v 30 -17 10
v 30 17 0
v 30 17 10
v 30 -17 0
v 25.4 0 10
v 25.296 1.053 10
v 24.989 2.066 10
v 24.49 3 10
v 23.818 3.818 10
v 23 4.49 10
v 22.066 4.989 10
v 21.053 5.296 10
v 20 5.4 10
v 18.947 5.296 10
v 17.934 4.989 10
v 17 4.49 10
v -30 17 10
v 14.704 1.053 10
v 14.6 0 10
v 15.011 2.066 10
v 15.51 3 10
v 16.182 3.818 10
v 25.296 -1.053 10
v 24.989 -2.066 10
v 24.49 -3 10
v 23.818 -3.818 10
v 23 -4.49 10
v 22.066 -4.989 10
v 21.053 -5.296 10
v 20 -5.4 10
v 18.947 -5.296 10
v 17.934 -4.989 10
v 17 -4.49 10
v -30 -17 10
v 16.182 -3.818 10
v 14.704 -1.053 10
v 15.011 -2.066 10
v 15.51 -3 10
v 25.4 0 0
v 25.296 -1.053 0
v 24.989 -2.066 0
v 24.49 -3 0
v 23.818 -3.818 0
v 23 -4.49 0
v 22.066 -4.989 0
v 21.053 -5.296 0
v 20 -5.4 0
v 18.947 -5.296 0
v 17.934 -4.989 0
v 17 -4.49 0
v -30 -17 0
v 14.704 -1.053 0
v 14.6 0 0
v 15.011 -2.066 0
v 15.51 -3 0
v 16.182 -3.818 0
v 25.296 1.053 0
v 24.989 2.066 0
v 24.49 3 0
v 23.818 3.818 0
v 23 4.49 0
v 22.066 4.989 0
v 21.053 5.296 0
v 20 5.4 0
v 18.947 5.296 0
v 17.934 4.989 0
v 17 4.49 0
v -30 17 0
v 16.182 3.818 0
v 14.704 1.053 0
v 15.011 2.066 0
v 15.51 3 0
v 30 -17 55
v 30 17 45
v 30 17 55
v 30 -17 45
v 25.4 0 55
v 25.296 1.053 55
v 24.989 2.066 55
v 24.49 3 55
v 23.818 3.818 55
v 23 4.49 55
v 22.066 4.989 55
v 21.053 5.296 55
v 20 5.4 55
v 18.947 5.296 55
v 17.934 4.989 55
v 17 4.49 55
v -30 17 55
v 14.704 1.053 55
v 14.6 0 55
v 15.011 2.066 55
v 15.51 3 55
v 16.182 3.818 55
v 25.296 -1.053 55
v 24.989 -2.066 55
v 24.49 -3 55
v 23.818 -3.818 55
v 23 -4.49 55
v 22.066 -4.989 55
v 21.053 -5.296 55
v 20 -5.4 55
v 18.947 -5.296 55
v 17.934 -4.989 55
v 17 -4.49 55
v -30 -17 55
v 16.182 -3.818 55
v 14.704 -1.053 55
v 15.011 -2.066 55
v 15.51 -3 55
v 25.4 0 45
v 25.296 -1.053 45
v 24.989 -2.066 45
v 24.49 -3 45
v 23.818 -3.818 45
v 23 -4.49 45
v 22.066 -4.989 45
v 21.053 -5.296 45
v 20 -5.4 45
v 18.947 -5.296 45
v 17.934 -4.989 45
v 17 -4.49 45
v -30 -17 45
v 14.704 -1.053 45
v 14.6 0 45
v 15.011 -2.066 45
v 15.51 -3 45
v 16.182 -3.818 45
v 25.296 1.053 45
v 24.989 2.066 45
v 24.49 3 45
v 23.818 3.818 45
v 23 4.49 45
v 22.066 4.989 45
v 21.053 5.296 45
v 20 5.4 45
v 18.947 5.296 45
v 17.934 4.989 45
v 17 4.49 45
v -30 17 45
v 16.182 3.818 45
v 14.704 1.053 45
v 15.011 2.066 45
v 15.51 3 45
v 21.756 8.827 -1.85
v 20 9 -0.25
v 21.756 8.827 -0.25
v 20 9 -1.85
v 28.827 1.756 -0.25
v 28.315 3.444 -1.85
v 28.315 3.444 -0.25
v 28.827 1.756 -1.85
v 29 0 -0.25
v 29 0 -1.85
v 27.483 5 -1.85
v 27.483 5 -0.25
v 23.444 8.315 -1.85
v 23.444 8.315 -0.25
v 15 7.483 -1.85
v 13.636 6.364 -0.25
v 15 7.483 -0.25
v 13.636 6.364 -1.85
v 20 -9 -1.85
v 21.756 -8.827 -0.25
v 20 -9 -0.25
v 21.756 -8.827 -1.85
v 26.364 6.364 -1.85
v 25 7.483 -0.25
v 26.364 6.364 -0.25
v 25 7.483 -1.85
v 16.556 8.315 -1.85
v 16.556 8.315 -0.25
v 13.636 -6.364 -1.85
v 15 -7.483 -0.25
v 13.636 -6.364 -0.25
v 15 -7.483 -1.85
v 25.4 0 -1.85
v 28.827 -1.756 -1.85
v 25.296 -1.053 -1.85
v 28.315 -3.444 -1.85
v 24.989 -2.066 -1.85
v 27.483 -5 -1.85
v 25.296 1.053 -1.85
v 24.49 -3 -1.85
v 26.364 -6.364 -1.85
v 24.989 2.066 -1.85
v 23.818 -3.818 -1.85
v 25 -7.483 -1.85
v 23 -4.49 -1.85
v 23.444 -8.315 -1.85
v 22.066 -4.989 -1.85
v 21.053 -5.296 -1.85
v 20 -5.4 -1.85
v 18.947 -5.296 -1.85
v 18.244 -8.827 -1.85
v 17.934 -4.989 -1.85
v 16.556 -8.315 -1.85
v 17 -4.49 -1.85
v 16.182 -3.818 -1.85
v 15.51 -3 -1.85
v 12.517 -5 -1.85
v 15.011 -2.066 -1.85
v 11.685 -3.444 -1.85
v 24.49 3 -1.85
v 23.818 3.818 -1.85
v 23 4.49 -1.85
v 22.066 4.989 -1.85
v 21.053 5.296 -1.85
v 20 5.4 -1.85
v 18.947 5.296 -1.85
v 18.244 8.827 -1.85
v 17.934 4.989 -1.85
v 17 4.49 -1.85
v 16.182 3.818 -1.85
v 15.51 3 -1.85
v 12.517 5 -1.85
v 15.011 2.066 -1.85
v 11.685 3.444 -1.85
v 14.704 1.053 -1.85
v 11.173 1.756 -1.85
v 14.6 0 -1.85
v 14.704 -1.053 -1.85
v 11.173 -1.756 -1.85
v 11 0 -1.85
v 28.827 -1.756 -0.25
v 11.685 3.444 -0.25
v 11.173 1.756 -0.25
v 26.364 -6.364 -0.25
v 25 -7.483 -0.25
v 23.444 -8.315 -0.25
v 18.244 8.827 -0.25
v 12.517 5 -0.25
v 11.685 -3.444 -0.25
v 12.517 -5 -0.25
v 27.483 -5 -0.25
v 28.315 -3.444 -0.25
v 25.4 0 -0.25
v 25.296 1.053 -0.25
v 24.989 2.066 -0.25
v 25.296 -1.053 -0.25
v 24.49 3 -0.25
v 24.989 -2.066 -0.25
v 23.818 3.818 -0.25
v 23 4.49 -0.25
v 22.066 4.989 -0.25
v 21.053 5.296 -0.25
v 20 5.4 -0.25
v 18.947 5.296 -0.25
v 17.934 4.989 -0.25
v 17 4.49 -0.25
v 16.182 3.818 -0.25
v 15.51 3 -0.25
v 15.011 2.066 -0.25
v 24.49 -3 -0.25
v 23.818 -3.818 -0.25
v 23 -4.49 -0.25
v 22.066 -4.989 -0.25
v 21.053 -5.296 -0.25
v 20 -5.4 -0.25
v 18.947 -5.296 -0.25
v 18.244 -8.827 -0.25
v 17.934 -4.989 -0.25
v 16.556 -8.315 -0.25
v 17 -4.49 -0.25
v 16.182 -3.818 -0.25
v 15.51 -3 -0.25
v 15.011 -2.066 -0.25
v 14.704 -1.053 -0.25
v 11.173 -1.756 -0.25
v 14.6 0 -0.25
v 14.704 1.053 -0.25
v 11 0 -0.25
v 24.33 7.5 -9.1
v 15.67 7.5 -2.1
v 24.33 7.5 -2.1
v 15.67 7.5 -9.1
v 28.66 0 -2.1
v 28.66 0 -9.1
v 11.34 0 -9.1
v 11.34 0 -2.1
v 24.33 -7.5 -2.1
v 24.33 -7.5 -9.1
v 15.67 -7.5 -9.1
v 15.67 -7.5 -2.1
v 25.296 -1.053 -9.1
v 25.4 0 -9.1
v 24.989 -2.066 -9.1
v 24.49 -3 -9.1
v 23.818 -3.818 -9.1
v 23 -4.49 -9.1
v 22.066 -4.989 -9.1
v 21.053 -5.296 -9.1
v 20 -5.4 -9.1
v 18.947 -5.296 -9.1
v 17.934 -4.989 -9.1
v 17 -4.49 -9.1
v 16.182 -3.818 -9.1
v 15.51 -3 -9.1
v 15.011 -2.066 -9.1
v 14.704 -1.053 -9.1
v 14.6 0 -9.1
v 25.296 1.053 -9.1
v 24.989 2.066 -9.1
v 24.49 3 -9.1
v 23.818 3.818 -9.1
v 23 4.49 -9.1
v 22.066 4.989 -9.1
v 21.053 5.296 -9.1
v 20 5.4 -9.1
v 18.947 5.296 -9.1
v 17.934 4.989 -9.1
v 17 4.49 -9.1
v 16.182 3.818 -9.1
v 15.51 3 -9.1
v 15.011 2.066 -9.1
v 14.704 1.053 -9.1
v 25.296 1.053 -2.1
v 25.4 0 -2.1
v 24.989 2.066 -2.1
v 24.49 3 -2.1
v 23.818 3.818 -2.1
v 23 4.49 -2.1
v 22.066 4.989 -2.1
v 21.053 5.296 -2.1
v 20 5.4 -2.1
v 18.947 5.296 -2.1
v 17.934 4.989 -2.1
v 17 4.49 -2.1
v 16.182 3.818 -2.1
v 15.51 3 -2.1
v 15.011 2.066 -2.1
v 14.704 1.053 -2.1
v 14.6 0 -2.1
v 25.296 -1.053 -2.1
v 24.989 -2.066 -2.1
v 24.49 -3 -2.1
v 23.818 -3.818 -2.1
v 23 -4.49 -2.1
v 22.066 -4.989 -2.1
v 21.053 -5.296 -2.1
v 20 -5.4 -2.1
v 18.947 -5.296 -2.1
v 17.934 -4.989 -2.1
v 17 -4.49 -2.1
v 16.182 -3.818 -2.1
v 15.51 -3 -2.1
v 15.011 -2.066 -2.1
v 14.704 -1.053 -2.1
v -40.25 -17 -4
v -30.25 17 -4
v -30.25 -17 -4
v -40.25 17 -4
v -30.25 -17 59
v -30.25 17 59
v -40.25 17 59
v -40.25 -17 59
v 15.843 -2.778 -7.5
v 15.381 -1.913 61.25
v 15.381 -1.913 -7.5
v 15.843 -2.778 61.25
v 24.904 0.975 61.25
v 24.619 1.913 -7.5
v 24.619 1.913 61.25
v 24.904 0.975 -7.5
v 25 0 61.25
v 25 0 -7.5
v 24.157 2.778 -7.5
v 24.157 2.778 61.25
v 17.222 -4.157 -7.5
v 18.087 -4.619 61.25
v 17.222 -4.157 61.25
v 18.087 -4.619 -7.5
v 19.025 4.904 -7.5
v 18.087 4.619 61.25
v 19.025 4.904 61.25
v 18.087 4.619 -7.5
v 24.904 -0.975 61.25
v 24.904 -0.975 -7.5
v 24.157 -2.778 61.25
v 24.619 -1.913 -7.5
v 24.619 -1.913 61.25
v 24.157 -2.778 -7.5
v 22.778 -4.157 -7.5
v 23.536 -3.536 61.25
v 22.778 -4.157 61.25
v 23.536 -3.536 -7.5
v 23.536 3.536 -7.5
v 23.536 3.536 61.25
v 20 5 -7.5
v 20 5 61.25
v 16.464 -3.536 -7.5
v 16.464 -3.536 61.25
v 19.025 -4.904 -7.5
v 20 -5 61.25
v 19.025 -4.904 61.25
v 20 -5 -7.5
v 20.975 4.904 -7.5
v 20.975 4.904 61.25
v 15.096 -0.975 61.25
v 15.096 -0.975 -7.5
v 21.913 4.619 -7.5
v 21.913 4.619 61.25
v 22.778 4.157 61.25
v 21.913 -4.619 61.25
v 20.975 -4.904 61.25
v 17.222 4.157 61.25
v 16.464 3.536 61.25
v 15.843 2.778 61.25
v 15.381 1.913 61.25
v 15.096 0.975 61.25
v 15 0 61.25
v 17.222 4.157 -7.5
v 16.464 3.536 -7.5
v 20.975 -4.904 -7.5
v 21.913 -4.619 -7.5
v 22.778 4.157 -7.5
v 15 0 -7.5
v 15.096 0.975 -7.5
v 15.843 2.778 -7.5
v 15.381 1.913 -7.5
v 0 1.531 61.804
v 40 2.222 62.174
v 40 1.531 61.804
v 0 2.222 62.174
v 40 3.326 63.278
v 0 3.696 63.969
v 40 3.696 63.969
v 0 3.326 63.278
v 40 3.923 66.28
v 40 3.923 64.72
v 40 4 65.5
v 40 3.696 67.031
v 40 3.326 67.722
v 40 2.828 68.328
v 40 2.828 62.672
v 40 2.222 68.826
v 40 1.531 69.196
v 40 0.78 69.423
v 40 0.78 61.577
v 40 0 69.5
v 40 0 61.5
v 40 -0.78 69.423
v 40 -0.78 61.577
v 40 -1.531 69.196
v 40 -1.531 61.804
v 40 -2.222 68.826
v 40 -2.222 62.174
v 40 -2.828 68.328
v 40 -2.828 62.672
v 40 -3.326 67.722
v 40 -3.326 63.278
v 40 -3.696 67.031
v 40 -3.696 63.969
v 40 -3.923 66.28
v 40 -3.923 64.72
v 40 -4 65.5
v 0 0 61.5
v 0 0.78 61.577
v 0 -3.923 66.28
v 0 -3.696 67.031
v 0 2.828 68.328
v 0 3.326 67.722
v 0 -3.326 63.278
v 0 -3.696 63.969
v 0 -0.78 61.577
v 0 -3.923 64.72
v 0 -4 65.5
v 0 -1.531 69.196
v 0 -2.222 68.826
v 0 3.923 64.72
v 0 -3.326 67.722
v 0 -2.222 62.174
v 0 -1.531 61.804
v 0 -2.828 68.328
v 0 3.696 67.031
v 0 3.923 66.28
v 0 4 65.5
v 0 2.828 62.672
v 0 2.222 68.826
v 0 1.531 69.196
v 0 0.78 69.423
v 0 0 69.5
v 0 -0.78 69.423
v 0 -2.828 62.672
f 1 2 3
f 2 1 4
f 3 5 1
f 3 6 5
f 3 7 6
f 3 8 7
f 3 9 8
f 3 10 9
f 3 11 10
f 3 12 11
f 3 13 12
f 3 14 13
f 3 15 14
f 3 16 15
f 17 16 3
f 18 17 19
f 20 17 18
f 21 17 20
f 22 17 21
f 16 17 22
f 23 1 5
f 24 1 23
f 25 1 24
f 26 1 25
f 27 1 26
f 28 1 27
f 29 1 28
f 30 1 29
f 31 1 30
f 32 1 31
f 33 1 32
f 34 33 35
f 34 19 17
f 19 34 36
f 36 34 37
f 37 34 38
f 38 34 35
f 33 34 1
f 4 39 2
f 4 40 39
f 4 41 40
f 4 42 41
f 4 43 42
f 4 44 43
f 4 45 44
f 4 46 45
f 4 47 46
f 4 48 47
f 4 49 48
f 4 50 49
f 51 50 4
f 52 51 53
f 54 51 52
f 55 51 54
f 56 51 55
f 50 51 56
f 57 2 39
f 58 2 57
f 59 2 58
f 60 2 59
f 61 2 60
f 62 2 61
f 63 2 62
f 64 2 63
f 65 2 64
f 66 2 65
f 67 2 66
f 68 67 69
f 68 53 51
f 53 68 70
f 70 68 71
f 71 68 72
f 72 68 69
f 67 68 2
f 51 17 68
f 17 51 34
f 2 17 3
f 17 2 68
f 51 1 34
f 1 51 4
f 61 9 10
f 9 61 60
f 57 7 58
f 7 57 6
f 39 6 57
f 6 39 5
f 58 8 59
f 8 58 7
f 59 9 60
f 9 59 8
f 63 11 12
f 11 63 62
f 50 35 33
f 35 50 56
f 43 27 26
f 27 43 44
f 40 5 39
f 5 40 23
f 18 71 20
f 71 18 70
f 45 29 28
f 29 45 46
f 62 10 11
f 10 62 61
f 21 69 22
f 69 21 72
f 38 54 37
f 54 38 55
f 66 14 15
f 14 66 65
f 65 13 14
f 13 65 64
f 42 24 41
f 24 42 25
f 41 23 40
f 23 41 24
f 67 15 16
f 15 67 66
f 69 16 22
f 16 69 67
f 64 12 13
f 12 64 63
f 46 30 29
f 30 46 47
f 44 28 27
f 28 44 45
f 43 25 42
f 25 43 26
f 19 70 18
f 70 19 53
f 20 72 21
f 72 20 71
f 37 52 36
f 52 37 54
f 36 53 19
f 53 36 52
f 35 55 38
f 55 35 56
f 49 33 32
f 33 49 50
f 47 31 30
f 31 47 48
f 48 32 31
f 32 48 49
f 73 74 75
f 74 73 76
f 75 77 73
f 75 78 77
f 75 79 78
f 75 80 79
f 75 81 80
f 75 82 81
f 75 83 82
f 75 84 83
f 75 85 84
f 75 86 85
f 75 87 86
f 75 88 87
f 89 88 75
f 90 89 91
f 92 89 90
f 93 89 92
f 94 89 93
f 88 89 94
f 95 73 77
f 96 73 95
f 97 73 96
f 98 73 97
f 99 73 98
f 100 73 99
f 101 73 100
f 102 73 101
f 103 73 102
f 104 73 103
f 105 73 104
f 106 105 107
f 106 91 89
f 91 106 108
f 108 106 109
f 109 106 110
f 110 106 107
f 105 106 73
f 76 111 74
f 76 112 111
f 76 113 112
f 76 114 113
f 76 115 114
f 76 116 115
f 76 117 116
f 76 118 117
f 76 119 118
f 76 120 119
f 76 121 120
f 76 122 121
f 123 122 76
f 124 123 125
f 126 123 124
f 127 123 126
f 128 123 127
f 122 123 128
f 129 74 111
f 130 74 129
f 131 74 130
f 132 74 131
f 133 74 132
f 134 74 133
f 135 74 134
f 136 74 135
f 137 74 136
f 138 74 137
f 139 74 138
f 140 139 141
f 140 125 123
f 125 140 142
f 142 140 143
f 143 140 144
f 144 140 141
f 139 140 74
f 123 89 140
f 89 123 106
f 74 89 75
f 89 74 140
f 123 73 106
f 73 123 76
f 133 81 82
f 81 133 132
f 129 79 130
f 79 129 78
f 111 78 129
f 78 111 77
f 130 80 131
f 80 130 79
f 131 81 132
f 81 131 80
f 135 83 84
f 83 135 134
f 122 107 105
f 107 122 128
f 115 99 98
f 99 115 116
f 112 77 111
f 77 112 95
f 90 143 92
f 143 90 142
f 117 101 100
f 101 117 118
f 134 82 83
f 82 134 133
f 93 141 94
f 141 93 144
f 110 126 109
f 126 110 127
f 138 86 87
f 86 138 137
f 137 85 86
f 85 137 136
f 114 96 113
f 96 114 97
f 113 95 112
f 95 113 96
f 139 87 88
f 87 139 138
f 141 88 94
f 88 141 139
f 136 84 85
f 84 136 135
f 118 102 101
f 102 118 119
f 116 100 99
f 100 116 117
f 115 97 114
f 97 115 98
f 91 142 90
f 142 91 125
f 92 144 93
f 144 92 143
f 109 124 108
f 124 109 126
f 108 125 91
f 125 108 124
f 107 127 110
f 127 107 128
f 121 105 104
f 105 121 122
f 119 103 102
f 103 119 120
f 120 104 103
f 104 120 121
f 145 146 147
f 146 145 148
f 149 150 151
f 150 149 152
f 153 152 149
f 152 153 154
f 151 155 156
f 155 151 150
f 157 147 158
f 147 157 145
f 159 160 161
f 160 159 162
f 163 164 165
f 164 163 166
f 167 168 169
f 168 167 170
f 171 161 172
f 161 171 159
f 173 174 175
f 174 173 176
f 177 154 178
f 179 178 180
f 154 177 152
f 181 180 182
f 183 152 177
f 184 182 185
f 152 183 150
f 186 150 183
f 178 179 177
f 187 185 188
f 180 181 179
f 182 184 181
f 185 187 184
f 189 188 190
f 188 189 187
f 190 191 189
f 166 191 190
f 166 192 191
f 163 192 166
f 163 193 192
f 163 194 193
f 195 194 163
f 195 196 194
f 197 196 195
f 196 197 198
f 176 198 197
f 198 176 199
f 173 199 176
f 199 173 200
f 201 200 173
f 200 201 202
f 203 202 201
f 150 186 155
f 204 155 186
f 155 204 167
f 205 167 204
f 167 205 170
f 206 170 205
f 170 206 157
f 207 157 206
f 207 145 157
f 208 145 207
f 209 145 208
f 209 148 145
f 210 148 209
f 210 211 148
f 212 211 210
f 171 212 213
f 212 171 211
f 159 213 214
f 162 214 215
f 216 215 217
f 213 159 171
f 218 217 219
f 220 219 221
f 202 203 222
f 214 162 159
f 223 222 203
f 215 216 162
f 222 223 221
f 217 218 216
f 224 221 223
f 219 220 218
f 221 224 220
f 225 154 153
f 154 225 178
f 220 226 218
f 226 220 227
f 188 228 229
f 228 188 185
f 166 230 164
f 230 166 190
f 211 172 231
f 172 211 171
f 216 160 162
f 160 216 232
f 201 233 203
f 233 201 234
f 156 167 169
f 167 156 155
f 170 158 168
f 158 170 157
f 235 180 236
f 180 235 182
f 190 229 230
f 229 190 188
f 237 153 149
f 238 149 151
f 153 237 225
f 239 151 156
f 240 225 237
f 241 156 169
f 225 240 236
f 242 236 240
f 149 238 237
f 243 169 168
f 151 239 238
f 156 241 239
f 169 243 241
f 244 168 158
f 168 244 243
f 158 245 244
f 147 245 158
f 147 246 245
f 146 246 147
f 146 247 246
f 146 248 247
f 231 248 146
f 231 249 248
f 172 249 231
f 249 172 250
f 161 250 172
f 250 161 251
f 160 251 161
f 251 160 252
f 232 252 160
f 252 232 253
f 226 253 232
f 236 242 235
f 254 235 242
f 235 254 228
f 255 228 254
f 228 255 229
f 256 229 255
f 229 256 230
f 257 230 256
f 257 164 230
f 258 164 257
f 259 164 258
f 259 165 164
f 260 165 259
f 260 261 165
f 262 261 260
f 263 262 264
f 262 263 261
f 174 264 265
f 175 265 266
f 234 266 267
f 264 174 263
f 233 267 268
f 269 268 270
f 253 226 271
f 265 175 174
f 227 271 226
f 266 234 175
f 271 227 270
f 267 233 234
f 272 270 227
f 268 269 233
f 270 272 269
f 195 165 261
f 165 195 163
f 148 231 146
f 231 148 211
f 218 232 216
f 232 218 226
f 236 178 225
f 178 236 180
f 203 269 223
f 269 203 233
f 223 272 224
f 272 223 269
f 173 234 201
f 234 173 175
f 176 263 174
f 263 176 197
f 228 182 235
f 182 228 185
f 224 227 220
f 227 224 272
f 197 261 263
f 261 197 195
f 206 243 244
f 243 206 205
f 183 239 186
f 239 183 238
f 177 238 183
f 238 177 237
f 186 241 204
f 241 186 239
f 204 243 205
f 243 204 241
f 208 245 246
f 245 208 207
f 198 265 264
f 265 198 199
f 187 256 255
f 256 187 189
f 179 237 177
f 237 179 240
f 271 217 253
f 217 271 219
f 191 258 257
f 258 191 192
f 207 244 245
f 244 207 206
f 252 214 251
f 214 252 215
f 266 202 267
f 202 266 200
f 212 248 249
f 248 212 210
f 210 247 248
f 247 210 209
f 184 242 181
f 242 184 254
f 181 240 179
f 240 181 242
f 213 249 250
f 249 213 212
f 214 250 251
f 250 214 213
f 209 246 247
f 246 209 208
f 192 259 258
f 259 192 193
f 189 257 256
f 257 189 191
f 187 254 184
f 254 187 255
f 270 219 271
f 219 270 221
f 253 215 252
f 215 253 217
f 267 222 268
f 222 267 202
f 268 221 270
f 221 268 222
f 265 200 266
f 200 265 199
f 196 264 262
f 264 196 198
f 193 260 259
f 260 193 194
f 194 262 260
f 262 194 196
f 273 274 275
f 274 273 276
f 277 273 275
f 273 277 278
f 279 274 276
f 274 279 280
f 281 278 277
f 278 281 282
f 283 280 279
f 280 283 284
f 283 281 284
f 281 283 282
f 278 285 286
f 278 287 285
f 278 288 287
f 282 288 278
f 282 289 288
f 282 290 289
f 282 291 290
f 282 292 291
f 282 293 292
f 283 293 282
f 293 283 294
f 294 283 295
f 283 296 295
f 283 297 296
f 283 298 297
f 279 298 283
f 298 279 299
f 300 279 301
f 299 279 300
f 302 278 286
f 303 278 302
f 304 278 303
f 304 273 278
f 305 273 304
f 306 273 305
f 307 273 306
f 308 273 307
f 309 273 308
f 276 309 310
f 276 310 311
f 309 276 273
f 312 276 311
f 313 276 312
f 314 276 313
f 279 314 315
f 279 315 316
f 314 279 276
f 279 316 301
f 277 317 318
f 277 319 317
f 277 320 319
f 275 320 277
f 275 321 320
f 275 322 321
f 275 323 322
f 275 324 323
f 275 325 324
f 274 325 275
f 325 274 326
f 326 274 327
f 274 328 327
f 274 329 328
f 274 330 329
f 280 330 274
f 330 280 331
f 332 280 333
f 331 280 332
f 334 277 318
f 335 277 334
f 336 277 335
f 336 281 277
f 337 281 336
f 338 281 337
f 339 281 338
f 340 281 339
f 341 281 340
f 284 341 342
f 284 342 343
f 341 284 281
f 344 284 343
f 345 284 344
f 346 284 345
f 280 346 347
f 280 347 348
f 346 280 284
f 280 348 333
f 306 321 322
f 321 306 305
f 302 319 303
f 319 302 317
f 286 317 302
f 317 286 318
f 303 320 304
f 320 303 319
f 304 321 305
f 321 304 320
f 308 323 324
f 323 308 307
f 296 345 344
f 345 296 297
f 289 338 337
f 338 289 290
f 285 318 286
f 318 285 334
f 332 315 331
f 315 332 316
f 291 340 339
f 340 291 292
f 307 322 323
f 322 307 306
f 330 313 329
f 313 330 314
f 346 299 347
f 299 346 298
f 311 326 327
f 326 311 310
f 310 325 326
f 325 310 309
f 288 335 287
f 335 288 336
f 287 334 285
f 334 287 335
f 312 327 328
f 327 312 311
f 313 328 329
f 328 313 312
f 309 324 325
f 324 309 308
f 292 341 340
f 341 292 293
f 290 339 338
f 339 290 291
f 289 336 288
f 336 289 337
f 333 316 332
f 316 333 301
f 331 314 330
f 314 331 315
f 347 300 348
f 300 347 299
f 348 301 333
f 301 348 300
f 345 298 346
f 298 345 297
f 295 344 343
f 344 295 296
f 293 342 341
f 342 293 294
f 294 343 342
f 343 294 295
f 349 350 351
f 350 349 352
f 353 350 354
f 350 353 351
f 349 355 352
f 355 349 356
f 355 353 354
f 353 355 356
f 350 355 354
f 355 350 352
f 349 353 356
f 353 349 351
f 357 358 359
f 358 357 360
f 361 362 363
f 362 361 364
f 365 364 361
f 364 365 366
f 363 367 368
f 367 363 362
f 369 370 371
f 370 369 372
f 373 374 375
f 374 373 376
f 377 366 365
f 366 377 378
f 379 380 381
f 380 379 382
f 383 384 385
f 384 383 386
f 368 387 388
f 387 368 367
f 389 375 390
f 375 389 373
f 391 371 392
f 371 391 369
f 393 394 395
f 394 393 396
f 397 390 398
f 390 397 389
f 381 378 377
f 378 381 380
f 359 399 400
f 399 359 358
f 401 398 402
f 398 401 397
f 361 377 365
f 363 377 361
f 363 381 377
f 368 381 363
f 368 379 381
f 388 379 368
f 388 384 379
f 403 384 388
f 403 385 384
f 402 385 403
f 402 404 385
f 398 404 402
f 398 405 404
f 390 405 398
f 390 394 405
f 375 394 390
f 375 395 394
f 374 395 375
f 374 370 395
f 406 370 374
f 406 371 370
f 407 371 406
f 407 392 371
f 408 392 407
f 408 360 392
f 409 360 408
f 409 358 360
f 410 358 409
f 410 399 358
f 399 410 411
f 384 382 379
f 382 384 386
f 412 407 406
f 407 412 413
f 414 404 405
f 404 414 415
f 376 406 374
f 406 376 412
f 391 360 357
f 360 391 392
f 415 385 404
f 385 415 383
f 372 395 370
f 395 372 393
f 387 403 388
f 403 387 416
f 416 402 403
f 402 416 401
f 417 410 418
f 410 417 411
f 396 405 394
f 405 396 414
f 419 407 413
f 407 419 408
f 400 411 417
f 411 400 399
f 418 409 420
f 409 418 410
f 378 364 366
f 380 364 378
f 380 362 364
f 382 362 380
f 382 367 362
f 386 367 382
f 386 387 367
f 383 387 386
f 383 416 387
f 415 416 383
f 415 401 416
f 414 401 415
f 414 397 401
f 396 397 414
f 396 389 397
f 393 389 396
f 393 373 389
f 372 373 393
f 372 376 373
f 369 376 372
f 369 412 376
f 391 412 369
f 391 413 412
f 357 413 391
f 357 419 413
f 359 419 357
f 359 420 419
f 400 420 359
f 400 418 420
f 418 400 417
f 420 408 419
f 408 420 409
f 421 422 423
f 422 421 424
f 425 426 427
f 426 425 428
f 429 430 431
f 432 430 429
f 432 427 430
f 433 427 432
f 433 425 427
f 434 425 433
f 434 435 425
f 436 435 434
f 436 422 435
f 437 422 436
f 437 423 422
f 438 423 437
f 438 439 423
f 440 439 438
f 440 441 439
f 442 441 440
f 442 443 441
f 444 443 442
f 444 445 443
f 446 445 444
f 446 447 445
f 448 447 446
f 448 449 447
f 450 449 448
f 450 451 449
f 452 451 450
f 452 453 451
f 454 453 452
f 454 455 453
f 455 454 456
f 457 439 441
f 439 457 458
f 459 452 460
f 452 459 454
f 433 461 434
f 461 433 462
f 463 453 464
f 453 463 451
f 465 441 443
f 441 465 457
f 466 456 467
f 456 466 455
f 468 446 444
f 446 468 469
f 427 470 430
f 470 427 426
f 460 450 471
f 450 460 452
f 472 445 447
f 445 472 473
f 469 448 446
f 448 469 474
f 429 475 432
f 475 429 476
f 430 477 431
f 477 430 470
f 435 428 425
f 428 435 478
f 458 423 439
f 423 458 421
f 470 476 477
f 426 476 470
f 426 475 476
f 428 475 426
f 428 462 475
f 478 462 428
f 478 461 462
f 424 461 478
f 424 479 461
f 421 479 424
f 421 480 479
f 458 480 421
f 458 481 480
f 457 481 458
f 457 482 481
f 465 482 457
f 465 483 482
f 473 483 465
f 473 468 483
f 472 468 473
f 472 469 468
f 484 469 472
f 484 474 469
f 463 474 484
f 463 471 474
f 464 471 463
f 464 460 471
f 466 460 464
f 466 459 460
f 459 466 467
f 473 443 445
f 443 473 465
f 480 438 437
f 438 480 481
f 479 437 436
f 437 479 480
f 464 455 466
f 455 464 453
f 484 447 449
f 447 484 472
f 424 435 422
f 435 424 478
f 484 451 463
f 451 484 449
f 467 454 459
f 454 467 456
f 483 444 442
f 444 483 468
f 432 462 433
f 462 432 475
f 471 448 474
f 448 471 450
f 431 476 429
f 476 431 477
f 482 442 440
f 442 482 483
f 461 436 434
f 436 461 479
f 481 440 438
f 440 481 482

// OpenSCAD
$fn = 32;

// ------------------------------------------------------------------------
// C clamp: throat 45 mm, screw d10
// Every part is its own module, assembly() places every instance.
// ------------------------------------------------------------------------

// --- part 1 ---
module clamp_arm() {
  difference() {
    translate([-30, -17, 0]) cube([60, 34, 10]);
    translate([20, 0, -1]) cylinder(h = 12, d = 10.8);
  }
}

// --- part 2 ---
module clamp_spine() {
  difference() {
    translate([-31.5, -17, 0]) cube([63, 34, 10]);
  }
}

// --- part 3 ---
module clamp_screw() {
  translate([0, 0, -34.375]) cylinder(h = 68.75, d = 10);
}

// --- part 4 ---
module clamp_washer() {
  difference() {
      translate([0, 0, 0]) cylinder(h = 1.6, d = 18);
      translate([0, 0, -1]) cylinder(h = 3.6, d = 10.8);
    }
}

// --- part 5 ---
module clamp_nut() {
  difference() {
    linear_extrude(height = 7) polygon(points = [[8.66, 0], [4.33, 7.5], [-4.33, 7.5], [-8.66, 0], [-4.33, -7.5], [4.33, -7.5]]);
    translate([0, 0, -1]) cylinder(h = 9, d = 10.8);
  }
}

// --- part 6 ---
module tommy_bar() {
  translate([0, 0, -20]) cylinder(h = 40, d = 8);
}

// --- assembly ---
module assembly() {
  color([0.80, 0.24, 0.20]) translate([0, 0, 0]) rotate([0, 0, 0]) clamp_arm();
  color([0.20, 0.45, 0.75]) translate([0, 0, 45]) rotate([0, 0, 0]) clamp_arm();
  color([0.25, 0.62, 0.32]) translate([-40.25, 0, 27.5]) rotate([0, 90, 0]) clamp_spine();
  color([0.92, 0.70, 0.18]) translate([20, 0, 26.875]) rotate([0, 0, 0]) clamp_screw();
  color([0.58, 0.35, 0.70]) translate([20, 0, -1.85]) rotate([0, 0, 0]) clamp_washer();
  color([0.16, 0.66, 0.66]) translate([20, 0, -9.1]) rotate([0, 0, 0]) clamp_nut();
  color([0.85, 0.48, 0.18]) translate([20, 0, 65.5]) rotate([0, 90, 0]) tommy_bar();
}

assembly();
